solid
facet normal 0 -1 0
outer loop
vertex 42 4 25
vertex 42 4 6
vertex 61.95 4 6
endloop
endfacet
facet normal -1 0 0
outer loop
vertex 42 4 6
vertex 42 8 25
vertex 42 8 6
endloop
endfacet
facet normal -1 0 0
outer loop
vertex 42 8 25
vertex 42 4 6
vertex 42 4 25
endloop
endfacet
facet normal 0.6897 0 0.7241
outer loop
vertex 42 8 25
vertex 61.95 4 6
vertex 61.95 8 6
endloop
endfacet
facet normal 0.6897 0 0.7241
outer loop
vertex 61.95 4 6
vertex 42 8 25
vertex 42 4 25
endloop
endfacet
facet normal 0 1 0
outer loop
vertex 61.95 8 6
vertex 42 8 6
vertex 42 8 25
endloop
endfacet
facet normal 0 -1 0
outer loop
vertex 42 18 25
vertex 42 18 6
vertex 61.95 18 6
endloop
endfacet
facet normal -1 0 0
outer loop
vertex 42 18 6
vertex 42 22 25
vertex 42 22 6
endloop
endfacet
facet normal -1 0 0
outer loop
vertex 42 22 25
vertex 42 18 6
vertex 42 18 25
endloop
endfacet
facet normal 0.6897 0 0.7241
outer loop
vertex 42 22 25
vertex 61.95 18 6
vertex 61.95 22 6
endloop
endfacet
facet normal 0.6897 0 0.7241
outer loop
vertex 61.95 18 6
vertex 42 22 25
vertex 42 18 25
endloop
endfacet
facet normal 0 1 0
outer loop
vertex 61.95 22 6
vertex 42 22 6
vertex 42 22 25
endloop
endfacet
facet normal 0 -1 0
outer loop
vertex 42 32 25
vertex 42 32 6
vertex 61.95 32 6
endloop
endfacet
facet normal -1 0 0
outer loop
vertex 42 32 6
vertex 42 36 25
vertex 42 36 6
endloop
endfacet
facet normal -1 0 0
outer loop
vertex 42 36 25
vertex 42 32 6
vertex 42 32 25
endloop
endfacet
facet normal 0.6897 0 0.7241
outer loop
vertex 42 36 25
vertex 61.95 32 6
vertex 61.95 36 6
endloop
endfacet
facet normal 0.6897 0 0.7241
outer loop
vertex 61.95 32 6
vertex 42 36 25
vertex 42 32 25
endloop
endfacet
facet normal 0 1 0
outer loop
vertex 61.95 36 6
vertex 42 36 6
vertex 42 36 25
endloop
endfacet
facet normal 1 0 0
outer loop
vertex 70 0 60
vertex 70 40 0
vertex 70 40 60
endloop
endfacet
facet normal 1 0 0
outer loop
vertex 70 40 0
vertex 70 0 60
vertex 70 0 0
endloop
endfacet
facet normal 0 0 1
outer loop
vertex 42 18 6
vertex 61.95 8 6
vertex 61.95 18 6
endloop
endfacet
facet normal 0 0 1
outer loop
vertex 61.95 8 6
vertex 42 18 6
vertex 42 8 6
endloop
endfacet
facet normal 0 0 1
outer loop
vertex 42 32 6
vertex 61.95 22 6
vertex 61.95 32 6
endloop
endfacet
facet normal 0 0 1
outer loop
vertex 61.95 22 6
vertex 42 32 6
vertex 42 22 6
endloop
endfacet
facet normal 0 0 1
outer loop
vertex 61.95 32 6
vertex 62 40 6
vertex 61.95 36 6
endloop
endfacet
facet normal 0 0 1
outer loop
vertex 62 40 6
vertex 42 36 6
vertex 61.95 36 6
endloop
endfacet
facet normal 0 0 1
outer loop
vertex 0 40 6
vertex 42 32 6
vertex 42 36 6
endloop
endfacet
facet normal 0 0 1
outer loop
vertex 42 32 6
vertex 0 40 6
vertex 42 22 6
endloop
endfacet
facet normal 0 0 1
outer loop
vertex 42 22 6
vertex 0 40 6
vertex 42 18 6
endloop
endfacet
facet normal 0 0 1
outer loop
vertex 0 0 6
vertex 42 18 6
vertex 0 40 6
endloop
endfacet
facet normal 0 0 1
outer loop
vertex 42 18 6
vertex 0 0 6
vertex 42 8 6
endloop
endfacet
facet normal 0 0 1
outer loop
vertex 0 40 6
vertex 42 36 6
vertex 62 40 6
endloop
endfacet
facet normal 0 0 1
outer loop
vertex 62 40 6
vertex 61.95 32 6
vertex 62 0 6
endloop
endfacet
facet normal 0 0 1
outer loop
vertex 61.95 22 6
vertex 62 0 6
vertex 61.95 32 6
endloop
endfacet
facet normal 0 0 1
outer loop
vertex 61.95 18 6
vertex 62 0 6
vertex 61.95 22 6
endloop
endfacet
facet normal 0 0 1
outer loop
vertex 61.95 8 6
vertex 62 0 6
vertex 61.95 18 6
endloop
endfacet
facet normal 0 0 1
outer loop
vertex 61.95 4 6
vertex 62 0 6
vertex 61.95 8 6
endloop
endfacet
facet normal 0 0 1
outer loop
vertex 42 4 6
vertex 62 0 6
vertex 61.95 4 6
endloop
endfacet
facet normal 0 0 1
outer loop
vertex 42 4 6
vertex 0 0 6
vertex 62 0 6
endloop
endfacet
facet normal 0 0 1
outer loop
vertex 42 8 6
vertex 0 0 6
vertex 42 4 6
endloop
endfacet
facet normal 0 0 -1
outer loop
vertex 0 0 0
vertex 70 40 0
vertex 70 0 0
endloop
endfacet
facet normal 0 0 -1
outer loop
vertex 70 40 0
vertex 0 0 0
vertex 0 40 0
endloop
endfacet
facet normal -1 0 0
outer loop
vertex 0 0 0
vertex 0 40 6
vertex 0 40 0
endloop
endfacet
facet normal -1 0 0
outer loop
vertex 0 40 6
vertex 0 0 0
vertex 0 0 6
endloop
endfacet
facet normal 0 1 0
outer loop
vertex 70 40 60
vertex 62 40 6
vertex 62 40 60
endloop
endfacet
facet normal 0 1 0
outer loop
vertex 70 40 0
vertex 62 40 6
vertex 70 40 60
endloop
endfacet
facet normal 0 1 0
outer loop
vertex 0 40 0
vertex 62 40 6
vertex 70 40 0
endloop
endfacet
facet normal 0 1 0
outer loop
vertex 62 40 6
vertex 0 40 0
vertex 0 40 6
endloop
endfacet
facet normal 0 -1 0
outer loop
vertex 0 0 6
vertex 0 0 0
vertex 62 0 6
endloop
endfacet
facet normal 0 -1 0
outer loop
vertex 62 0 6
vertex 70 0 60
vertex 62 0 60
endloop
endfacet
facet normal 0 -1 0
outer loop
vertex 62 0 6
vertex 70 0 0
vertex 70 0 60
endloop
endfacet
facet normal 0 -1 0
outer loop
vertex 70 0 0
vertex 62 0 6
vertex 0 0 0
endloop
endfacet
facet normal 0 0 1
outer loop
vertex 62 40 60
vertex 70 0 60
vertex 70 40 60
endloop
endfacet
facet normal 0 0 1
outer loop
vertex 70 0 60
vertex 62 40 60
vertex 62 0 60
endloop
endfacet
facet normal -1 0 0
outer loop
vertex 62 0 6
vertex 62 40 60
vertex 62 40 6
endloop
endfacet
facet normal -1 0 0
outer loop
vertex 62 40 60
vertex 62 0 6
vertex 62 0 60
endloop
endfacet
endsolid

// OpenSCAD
$fn = 32;

// ----------------------------------------------------------------------
// Rib bracket: 3-gusset L bracket
// ----------------------------------------------------------------------

// --- parameters (mm) ---
base_l = 70;              // foot length, X
base_w = 40;              // foot width, Y
base_t = 6;               // foot thickness
plate_t = 8;              // upright plate thickness
plate_h = 60;             // overall height
gus_l = 20;               // gusset leg along the foot
gus_h = 20;               // gusset height
gus_t = 4;                // gusset thickness
gus_edge = 4;             // gusset margin from the foot edge
n_gus = 3;                // gusset count

gus_pitch = (base_w - 2 * gus_edge - gus_t) / (n_gus - 1);  // gusset pitch

union() {
  cube([base_l, base_w, base_t]);
  translate([base_l - plate_t, 0, base_t - 1])
    cube([plate_t, base_w, plate_h - base_t + 1]);
  for (i = [0 : n_gus - 1])
    translate([base_l - plate_t - gus_l, gus_edge + i * gus_pitch, base_t - 1])
      rotate([-90, 0, 0])
        linear_extrude(height = gus_t)
          polygon(points = [[0, 0], [gus_l + 1, 0], [0, -gus_h]]);
}
